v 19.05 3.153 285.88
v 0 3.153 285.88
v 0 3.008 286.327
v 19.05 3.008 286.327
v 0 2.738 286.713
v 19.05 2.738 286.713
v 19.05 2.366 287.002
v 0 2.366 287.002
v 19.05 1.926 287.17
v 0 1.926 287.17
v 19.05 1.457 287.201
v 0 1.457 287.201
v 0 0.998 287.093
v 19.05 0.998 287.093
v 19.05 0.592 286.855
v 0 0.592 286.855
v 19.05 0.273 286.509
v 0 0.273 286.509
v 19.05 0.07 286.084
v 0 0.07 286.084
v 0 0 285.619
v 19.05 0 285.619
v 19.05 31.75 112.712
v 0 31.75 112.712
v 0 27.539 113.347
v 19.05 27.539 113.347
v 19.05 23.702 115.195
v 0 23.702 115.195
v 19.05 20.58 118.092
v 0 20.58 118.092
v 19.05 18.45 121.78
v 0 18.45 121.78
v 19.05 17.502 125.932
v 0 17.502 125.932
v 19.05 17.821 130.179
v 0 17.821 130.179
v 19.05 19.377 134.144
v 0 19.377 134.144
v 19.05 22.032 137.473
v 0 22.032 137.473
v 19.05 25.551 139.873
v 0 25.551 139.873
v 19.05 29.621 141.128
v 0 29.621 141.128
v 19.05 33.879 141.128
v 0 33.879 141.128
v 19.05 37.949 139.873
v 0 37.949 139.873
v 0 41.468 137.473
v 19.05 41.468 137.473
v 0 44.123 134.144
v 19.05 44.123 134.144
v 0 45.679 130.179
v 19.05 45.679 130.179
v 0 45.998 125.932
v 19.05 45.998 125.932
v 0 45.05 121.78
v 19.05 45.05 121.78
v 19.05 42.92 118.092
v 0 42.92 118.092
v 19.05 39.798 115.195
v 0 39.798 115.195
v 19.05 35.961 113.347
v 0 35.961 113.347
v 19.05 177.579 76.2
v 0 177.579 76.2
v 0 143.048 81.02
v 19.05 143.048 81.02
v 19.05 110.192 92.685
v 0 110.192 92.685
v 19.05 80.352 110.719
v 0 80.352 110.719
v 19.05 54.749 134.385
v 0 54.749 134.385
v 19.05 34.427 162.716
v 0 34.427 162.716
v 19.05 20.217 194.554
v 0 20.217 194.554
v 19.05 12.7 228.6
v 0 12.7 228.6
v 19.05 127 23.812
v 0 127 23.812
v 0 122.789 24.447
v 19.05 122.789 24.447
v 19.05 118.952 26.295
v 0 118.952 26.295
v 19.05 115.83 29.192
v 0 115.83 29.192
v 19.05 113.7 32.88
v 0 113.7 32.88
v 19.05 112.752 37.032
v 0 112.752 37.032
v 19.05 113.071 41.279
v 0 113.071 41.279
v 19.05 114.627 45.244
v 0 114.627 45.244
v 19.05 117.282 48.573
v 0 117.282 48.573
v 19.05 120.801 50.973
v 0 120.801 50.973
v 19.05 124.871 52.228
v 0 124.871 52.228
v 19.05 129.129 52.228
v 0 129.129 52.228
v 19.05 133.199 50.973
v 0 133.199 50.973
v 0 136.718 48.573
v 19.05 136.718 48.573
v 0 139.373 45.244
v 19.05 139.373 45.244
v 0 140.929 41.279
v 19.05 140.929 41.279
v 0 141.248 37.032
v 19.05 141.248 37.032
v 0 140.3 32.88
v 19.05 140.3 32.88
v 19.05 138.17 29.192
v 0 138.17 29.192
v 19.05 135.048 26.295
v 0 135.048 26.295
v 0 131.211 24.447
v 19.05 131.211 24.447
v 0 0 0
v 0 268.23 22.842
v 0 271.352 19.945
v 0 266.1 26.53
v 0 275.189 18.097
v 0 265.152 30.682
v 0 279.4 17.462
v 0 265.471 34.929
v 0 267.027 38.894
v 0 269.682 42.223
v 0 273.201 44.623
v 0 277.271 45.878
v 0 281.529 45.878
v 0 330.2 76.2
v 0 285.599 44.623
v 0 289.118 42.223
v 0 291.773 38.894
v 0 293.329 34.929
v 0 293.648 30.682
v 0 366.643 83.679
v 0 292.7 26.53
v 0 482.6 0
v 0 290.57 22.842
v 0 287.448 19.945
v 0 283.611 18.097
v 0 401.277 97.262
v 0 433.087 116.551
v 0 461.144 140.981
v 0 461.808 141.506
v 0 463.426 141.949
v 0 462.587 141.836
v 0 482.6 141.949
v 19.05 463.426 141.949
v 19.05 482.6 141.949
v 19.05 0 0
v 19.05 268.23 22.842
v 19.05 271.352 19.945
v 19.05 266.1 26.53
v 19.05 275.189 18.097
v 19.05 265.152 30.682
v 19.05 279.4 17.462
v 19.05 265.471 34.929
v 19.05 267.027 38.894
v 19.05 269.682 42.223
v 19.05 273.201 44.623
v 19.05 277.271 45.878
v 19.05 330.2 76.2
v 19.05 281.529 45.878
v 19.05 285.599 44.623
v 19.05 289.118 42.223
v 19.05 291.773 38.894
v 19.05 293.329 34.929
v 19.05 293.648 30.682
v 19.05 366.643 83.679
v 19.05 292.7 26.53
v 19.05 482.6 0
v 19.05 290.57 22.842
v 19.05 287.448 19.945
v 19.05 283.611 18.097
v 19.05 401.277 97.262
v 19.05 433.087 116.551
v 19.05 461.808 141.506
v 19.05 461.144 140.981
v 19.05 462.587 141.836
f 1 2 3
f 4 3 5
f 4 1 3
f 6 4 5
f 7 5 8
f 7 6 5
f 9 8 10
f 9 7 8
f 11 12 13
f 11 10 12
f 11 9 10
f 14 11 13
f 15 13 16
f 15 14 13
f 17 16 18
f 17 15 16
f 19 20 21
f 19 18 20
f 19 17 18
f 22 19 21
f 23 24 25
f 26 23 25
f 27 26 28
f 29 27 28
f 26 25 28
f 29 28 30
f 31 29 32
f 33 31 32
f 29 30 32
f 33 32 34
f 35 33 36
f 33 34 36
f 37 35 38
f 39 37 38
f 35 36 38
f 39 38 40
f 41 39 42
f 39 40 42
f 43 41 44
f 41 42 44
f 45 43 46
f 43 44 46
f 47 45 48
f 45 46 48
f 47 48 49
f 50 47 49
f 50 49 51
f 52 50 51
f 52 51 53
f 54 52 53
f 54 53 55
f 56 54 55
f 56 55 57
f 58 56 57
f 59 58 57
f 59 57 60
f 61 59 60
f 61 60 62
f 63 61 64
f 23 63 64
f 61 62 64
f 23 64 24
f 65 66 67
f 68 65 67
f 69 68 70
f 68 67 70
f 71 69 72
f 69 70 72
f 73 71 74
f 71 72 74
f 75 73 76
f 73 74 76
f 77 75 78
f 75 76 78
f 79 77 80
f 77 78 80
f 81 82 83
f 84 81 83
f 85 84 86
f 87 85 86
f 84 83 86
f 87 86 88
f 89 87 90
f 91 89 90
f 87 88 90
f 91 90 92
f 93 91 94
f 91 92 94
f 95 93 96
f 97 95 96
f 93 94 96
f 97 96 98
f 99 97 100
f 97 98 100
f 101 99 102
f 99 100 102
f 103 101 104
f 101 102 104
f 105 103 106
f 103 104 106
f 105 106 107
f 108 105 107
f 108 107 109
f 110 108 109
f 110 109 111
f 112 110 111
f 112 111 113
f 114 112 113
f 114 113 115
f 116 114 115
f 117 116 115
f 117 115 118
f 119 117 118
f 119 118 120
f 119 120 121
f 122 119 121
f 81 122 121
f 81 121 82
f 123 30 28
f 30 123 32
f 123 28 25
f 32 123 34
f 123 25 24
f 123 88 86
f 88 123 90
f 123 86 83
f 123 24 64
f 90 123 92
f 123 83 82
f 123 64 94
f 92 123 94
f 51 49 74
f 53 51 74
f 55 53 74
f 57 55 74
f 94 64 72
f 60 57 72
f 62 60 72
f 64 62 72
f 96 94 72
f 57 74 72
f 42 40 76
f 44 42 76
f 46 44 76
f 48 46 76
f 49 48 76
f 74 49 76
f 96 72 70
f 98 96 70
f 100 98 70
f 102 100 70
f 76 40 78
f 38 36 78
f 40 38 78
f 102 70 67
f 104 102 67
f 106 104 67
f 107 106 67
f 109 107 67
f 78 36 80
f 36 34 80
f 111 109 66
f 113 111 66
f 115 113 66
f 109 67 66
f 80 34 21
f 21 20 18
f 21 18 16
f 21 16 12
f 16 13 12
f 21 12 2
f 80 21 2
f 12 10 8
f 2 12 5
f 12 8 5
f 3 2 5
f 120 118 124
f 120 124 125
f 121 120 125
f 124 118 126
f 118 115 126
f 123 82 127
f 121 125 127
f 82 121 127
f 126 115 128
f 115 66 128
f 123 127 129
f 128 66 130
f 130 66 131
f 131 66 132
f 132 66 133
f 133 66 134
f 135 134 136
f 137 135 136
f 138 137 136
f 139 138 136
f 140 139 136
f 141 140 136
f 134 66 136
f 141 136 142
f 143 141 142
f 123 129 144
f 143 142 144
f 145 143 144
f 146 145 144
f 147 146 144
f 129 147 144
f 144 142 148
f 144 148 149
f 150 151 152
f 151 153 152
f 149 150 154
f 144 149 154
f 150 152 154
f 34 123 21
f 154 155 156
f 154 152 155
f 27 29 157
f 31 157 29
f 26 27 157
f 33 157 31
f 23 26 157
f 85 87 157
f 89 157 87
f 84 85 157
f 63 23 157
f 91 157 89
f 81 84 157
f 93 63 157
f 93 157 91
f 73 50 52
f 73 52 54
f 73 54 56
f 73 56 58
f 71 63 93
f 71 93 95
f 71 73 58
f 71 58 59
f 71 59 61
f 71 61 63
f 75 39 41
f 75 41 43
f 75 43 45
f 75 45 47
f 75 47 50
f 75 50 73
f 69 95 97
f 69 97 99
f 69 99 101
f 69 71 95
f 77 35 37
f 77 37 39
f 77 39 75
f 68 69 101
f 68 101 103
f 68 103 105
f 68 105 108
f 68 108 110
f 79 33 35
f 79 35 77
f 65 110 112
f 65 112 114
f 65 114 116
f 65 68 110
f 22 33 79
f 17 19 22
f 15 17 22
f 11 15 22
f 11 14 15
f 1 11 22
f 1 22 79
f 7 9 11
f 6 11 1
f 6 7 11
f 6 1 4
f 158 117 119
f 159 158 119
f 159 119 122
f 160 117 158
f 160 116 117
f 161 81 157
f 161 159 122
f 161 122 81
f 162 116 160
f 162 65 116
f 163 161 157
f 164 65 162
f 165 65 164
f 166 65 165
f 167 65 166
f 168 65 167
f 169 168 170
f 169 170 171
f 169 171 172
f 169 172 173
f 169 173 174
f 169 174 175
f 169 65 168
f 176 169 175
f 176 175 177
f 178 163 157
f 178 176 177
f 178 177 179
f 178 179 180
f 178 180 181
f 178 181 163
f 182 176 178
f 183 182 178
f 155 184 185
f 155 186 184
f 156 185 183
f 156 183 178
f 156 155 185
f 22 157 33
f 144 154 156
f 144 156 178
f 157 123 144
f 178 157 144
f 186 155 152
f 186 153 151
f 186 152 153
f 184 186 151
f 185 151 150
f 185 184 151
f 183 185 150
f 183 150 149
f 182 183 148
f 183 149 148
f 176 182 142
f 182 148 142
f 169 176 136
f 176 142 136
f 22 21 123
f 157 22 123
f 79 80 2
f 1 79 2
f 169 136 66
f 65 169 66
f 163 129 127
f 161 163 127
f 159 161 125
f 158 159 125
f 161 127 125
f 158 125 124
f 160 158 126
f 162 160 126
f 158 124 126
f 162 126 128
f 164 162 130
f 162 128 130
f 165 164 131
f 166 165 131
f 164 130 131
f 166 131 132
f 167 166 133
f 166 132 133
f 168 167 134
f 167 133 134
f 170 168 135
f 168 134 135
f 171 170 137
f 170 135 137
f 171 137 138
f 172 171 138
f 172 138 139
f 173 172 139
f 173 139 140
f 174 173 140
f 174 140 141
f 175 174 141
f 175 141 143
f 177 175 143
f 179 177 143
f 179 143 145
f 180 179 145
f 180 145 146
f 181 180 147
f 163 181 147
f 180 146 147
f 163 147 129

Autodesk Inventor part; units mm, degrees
ref_plane "YZ Plane" through (0, 0, 0) normal (1, 0, 0) x (0, 1, 0)
ref_plane "XZ Plane" through (0, 0, 0) normal (0, 1, 0) x (-1, 0, 0)
ref_plane "XY Plane" through (0, 0, 0) normal (0, 0, 1) x (1, 0, 0)
sketch "Sketch1" plane through (0, 0, 0) normal (1, 0, 0) x (0, 1, 0)
  line L0 (0, 0) -> (330.2, 0) construction
  line L1 (330.2, 0) -> (330.2, 304.8)
  line L2 (330.2, 304.8) -> (0, 304.8) construction
  line L3 (0, 304.8) -> (0, 0)
  line L4 (0, 0) -> (482.6, 0)
  line L5 (482.6, 0) -> (482.6, 76.2) construction
  line L6 (482.6, 76.2) -> (0, 76.2)
  line L7 (0, 76.2) -> (0, 0) construction
  circle A0 centre (330.2, 304.8) radius 76.2
  line L8 (330.2, 304.8) -> (462.0741, 141.9491) construction
  line L9 (330.2, 304.8) -> (330.2, 76.2) construction
  line L10 (330.2, 304.8) -> (403.3287, 98.2908) construction
  arc A1 (330.2, 76.2) -> (462.0741, 141.9491) centre (304.8762, 292.1181) ccw
  line L11 (330.2, 304.8) -> (254, 304.8) construction
  line L12 (254, 304.8) -> (254, 228.6) construction
  line L13 (254, 228.6) -> (330.2, 228.6) construction
  line L14 (330.2, 228.6) -> (330.2, 304.8) construction
  line L15 (254, 228.6) -> (441.325, 228.6) construction
  circle A2 centre (254, 228.6) radius 6.35
  line L16 (254, 228.6) -> (241.3, 76.2) construction
  line L17 (254, 228.6) -> (419.1, 228.6) construction
  line L18 (0, 76.2) -> (190.5, 76.2) construction
  line L19 (190.5, 76.2) -> (190.5, 228.6) construction
  line L20 (190.5, 228.6) -> (0, 228.6) construction
  line L21 (0, 228.6) -> (0, 76.2) construction
  circle A3 centre (190.5, 228.6) radius 6.35
  line L22 (190.5, 228.6) -> (76.0017, 114.1017) construction
  line L23 (190.5, 228.6) -> (352.425, 228.6) construction
  line L24 (190.5, 228.6) -> (12.7, 228.6) construction
  arc A4 (12.7, 228.6) -> (190.5, 76.2) centre (184.0395, 248.5794) ccw
  line L25 (12.7, 228.6) -> (0, 304.8)
  line L26 (462.0741, 141.9491) -> (482.6, 141.9491)
  line L27 (482.6, 141.9491) -> (482.6, 0)
  line L28 (330.2, 76.2) -> (177.5789, 76.2)
  dimension "d0" = 330.2
  dimension "d1" = 304.8
  dimension "d2" = 482.6
  dimension "d3" = 76.2
  dimension "d4" = 152.4
  dimension "d5" = 209.55
  dimension "d9" = 228.6
  dimension "d13" = 219.075
  dimension "d16" = 39
  dimension "d17" = 19.5
  dimension "d19" = 76.2
  dimension "d20" = 76.2
  dimension "d25" = 12.7
  dimension "d39" = 190.5
  dimension "d40" = 152.4
  dimension "d41" = 12.7
  dimension "d42" = 161.925
  dimension "d43" = 135
  dimension "d44" = 177.8
extrude "Extrusion1" add sketch "Sketch1" along normal blind 19.05 contours L4 L3 L6 A4 L1 | L1 L6 L27 L4 | A1 L26 L27 L6 | A4 L6 | L3 L25 A4 L6
fillet "Fillet1" radius 1.5875 1 edges at (9.525, 0, 304.8)
fillet "Fillet2" radius 3.175 1 edges at (9.525, 462.0741, 141.9491)
sketch "Sketch2" plane through (19.05, 0, 0) normal (1, 0, 0) x (0, 0, -1)
  line L0 (0, 482.6) -> (0, 0) projected
  line L1 (0, 0) -> (-127, 0)
  line L2 (-127, 0) -> (-127, 31.75)
  line L3 (-127, 31.75) -> (0, 31.75)
  line L4 (0, 31.75) -> (0, 0)
  circle A0 centre (-127, 31.75) radius 25.4
  line L5 (0, 0) -> (-285.6186, 0) projected
  line L6 (0, 0) -> (-38.1, 0)
  line L7 (-38.1, 0) -> (-38.1, 127)
  line L8 (0, 127) -> (0, 0)
  line L9 (0, 127) -> (-38.1, 127)
  circle A1 centre (-38.1, 127) radius 50.8
  line L10 (0, 0) -> (-31.75, 0)
  line L11 (-31.75, 0) -> (-31.75, 279.4)
  line L12 (-31.75, 279.4) -> (0, 279.4)
  line L13 (0, 279.4) -> (0, 0)
  circle A2 centre (-31.75, 279.4) radius 50.8
  dimension "d49" = 127
  dimension "d50" = 31.75
  dimension "d51" = 50.8
  dimension "d52" = 38.1
  dimension "d53" = 101.6
  dimension "d54" = 279.4
  dimension "d55" = 101.6
  dimension "d56" = 31.75
  dimension "d57" = 127
hole "Hole1" at (19.05, 31.75, 127) at (19.05, 127, 38.1) at (19.05, 279.4, 31.75) direction (-1, 0, 0) diameter 28.575 end through all
properties part number "New Shooter Curve"
